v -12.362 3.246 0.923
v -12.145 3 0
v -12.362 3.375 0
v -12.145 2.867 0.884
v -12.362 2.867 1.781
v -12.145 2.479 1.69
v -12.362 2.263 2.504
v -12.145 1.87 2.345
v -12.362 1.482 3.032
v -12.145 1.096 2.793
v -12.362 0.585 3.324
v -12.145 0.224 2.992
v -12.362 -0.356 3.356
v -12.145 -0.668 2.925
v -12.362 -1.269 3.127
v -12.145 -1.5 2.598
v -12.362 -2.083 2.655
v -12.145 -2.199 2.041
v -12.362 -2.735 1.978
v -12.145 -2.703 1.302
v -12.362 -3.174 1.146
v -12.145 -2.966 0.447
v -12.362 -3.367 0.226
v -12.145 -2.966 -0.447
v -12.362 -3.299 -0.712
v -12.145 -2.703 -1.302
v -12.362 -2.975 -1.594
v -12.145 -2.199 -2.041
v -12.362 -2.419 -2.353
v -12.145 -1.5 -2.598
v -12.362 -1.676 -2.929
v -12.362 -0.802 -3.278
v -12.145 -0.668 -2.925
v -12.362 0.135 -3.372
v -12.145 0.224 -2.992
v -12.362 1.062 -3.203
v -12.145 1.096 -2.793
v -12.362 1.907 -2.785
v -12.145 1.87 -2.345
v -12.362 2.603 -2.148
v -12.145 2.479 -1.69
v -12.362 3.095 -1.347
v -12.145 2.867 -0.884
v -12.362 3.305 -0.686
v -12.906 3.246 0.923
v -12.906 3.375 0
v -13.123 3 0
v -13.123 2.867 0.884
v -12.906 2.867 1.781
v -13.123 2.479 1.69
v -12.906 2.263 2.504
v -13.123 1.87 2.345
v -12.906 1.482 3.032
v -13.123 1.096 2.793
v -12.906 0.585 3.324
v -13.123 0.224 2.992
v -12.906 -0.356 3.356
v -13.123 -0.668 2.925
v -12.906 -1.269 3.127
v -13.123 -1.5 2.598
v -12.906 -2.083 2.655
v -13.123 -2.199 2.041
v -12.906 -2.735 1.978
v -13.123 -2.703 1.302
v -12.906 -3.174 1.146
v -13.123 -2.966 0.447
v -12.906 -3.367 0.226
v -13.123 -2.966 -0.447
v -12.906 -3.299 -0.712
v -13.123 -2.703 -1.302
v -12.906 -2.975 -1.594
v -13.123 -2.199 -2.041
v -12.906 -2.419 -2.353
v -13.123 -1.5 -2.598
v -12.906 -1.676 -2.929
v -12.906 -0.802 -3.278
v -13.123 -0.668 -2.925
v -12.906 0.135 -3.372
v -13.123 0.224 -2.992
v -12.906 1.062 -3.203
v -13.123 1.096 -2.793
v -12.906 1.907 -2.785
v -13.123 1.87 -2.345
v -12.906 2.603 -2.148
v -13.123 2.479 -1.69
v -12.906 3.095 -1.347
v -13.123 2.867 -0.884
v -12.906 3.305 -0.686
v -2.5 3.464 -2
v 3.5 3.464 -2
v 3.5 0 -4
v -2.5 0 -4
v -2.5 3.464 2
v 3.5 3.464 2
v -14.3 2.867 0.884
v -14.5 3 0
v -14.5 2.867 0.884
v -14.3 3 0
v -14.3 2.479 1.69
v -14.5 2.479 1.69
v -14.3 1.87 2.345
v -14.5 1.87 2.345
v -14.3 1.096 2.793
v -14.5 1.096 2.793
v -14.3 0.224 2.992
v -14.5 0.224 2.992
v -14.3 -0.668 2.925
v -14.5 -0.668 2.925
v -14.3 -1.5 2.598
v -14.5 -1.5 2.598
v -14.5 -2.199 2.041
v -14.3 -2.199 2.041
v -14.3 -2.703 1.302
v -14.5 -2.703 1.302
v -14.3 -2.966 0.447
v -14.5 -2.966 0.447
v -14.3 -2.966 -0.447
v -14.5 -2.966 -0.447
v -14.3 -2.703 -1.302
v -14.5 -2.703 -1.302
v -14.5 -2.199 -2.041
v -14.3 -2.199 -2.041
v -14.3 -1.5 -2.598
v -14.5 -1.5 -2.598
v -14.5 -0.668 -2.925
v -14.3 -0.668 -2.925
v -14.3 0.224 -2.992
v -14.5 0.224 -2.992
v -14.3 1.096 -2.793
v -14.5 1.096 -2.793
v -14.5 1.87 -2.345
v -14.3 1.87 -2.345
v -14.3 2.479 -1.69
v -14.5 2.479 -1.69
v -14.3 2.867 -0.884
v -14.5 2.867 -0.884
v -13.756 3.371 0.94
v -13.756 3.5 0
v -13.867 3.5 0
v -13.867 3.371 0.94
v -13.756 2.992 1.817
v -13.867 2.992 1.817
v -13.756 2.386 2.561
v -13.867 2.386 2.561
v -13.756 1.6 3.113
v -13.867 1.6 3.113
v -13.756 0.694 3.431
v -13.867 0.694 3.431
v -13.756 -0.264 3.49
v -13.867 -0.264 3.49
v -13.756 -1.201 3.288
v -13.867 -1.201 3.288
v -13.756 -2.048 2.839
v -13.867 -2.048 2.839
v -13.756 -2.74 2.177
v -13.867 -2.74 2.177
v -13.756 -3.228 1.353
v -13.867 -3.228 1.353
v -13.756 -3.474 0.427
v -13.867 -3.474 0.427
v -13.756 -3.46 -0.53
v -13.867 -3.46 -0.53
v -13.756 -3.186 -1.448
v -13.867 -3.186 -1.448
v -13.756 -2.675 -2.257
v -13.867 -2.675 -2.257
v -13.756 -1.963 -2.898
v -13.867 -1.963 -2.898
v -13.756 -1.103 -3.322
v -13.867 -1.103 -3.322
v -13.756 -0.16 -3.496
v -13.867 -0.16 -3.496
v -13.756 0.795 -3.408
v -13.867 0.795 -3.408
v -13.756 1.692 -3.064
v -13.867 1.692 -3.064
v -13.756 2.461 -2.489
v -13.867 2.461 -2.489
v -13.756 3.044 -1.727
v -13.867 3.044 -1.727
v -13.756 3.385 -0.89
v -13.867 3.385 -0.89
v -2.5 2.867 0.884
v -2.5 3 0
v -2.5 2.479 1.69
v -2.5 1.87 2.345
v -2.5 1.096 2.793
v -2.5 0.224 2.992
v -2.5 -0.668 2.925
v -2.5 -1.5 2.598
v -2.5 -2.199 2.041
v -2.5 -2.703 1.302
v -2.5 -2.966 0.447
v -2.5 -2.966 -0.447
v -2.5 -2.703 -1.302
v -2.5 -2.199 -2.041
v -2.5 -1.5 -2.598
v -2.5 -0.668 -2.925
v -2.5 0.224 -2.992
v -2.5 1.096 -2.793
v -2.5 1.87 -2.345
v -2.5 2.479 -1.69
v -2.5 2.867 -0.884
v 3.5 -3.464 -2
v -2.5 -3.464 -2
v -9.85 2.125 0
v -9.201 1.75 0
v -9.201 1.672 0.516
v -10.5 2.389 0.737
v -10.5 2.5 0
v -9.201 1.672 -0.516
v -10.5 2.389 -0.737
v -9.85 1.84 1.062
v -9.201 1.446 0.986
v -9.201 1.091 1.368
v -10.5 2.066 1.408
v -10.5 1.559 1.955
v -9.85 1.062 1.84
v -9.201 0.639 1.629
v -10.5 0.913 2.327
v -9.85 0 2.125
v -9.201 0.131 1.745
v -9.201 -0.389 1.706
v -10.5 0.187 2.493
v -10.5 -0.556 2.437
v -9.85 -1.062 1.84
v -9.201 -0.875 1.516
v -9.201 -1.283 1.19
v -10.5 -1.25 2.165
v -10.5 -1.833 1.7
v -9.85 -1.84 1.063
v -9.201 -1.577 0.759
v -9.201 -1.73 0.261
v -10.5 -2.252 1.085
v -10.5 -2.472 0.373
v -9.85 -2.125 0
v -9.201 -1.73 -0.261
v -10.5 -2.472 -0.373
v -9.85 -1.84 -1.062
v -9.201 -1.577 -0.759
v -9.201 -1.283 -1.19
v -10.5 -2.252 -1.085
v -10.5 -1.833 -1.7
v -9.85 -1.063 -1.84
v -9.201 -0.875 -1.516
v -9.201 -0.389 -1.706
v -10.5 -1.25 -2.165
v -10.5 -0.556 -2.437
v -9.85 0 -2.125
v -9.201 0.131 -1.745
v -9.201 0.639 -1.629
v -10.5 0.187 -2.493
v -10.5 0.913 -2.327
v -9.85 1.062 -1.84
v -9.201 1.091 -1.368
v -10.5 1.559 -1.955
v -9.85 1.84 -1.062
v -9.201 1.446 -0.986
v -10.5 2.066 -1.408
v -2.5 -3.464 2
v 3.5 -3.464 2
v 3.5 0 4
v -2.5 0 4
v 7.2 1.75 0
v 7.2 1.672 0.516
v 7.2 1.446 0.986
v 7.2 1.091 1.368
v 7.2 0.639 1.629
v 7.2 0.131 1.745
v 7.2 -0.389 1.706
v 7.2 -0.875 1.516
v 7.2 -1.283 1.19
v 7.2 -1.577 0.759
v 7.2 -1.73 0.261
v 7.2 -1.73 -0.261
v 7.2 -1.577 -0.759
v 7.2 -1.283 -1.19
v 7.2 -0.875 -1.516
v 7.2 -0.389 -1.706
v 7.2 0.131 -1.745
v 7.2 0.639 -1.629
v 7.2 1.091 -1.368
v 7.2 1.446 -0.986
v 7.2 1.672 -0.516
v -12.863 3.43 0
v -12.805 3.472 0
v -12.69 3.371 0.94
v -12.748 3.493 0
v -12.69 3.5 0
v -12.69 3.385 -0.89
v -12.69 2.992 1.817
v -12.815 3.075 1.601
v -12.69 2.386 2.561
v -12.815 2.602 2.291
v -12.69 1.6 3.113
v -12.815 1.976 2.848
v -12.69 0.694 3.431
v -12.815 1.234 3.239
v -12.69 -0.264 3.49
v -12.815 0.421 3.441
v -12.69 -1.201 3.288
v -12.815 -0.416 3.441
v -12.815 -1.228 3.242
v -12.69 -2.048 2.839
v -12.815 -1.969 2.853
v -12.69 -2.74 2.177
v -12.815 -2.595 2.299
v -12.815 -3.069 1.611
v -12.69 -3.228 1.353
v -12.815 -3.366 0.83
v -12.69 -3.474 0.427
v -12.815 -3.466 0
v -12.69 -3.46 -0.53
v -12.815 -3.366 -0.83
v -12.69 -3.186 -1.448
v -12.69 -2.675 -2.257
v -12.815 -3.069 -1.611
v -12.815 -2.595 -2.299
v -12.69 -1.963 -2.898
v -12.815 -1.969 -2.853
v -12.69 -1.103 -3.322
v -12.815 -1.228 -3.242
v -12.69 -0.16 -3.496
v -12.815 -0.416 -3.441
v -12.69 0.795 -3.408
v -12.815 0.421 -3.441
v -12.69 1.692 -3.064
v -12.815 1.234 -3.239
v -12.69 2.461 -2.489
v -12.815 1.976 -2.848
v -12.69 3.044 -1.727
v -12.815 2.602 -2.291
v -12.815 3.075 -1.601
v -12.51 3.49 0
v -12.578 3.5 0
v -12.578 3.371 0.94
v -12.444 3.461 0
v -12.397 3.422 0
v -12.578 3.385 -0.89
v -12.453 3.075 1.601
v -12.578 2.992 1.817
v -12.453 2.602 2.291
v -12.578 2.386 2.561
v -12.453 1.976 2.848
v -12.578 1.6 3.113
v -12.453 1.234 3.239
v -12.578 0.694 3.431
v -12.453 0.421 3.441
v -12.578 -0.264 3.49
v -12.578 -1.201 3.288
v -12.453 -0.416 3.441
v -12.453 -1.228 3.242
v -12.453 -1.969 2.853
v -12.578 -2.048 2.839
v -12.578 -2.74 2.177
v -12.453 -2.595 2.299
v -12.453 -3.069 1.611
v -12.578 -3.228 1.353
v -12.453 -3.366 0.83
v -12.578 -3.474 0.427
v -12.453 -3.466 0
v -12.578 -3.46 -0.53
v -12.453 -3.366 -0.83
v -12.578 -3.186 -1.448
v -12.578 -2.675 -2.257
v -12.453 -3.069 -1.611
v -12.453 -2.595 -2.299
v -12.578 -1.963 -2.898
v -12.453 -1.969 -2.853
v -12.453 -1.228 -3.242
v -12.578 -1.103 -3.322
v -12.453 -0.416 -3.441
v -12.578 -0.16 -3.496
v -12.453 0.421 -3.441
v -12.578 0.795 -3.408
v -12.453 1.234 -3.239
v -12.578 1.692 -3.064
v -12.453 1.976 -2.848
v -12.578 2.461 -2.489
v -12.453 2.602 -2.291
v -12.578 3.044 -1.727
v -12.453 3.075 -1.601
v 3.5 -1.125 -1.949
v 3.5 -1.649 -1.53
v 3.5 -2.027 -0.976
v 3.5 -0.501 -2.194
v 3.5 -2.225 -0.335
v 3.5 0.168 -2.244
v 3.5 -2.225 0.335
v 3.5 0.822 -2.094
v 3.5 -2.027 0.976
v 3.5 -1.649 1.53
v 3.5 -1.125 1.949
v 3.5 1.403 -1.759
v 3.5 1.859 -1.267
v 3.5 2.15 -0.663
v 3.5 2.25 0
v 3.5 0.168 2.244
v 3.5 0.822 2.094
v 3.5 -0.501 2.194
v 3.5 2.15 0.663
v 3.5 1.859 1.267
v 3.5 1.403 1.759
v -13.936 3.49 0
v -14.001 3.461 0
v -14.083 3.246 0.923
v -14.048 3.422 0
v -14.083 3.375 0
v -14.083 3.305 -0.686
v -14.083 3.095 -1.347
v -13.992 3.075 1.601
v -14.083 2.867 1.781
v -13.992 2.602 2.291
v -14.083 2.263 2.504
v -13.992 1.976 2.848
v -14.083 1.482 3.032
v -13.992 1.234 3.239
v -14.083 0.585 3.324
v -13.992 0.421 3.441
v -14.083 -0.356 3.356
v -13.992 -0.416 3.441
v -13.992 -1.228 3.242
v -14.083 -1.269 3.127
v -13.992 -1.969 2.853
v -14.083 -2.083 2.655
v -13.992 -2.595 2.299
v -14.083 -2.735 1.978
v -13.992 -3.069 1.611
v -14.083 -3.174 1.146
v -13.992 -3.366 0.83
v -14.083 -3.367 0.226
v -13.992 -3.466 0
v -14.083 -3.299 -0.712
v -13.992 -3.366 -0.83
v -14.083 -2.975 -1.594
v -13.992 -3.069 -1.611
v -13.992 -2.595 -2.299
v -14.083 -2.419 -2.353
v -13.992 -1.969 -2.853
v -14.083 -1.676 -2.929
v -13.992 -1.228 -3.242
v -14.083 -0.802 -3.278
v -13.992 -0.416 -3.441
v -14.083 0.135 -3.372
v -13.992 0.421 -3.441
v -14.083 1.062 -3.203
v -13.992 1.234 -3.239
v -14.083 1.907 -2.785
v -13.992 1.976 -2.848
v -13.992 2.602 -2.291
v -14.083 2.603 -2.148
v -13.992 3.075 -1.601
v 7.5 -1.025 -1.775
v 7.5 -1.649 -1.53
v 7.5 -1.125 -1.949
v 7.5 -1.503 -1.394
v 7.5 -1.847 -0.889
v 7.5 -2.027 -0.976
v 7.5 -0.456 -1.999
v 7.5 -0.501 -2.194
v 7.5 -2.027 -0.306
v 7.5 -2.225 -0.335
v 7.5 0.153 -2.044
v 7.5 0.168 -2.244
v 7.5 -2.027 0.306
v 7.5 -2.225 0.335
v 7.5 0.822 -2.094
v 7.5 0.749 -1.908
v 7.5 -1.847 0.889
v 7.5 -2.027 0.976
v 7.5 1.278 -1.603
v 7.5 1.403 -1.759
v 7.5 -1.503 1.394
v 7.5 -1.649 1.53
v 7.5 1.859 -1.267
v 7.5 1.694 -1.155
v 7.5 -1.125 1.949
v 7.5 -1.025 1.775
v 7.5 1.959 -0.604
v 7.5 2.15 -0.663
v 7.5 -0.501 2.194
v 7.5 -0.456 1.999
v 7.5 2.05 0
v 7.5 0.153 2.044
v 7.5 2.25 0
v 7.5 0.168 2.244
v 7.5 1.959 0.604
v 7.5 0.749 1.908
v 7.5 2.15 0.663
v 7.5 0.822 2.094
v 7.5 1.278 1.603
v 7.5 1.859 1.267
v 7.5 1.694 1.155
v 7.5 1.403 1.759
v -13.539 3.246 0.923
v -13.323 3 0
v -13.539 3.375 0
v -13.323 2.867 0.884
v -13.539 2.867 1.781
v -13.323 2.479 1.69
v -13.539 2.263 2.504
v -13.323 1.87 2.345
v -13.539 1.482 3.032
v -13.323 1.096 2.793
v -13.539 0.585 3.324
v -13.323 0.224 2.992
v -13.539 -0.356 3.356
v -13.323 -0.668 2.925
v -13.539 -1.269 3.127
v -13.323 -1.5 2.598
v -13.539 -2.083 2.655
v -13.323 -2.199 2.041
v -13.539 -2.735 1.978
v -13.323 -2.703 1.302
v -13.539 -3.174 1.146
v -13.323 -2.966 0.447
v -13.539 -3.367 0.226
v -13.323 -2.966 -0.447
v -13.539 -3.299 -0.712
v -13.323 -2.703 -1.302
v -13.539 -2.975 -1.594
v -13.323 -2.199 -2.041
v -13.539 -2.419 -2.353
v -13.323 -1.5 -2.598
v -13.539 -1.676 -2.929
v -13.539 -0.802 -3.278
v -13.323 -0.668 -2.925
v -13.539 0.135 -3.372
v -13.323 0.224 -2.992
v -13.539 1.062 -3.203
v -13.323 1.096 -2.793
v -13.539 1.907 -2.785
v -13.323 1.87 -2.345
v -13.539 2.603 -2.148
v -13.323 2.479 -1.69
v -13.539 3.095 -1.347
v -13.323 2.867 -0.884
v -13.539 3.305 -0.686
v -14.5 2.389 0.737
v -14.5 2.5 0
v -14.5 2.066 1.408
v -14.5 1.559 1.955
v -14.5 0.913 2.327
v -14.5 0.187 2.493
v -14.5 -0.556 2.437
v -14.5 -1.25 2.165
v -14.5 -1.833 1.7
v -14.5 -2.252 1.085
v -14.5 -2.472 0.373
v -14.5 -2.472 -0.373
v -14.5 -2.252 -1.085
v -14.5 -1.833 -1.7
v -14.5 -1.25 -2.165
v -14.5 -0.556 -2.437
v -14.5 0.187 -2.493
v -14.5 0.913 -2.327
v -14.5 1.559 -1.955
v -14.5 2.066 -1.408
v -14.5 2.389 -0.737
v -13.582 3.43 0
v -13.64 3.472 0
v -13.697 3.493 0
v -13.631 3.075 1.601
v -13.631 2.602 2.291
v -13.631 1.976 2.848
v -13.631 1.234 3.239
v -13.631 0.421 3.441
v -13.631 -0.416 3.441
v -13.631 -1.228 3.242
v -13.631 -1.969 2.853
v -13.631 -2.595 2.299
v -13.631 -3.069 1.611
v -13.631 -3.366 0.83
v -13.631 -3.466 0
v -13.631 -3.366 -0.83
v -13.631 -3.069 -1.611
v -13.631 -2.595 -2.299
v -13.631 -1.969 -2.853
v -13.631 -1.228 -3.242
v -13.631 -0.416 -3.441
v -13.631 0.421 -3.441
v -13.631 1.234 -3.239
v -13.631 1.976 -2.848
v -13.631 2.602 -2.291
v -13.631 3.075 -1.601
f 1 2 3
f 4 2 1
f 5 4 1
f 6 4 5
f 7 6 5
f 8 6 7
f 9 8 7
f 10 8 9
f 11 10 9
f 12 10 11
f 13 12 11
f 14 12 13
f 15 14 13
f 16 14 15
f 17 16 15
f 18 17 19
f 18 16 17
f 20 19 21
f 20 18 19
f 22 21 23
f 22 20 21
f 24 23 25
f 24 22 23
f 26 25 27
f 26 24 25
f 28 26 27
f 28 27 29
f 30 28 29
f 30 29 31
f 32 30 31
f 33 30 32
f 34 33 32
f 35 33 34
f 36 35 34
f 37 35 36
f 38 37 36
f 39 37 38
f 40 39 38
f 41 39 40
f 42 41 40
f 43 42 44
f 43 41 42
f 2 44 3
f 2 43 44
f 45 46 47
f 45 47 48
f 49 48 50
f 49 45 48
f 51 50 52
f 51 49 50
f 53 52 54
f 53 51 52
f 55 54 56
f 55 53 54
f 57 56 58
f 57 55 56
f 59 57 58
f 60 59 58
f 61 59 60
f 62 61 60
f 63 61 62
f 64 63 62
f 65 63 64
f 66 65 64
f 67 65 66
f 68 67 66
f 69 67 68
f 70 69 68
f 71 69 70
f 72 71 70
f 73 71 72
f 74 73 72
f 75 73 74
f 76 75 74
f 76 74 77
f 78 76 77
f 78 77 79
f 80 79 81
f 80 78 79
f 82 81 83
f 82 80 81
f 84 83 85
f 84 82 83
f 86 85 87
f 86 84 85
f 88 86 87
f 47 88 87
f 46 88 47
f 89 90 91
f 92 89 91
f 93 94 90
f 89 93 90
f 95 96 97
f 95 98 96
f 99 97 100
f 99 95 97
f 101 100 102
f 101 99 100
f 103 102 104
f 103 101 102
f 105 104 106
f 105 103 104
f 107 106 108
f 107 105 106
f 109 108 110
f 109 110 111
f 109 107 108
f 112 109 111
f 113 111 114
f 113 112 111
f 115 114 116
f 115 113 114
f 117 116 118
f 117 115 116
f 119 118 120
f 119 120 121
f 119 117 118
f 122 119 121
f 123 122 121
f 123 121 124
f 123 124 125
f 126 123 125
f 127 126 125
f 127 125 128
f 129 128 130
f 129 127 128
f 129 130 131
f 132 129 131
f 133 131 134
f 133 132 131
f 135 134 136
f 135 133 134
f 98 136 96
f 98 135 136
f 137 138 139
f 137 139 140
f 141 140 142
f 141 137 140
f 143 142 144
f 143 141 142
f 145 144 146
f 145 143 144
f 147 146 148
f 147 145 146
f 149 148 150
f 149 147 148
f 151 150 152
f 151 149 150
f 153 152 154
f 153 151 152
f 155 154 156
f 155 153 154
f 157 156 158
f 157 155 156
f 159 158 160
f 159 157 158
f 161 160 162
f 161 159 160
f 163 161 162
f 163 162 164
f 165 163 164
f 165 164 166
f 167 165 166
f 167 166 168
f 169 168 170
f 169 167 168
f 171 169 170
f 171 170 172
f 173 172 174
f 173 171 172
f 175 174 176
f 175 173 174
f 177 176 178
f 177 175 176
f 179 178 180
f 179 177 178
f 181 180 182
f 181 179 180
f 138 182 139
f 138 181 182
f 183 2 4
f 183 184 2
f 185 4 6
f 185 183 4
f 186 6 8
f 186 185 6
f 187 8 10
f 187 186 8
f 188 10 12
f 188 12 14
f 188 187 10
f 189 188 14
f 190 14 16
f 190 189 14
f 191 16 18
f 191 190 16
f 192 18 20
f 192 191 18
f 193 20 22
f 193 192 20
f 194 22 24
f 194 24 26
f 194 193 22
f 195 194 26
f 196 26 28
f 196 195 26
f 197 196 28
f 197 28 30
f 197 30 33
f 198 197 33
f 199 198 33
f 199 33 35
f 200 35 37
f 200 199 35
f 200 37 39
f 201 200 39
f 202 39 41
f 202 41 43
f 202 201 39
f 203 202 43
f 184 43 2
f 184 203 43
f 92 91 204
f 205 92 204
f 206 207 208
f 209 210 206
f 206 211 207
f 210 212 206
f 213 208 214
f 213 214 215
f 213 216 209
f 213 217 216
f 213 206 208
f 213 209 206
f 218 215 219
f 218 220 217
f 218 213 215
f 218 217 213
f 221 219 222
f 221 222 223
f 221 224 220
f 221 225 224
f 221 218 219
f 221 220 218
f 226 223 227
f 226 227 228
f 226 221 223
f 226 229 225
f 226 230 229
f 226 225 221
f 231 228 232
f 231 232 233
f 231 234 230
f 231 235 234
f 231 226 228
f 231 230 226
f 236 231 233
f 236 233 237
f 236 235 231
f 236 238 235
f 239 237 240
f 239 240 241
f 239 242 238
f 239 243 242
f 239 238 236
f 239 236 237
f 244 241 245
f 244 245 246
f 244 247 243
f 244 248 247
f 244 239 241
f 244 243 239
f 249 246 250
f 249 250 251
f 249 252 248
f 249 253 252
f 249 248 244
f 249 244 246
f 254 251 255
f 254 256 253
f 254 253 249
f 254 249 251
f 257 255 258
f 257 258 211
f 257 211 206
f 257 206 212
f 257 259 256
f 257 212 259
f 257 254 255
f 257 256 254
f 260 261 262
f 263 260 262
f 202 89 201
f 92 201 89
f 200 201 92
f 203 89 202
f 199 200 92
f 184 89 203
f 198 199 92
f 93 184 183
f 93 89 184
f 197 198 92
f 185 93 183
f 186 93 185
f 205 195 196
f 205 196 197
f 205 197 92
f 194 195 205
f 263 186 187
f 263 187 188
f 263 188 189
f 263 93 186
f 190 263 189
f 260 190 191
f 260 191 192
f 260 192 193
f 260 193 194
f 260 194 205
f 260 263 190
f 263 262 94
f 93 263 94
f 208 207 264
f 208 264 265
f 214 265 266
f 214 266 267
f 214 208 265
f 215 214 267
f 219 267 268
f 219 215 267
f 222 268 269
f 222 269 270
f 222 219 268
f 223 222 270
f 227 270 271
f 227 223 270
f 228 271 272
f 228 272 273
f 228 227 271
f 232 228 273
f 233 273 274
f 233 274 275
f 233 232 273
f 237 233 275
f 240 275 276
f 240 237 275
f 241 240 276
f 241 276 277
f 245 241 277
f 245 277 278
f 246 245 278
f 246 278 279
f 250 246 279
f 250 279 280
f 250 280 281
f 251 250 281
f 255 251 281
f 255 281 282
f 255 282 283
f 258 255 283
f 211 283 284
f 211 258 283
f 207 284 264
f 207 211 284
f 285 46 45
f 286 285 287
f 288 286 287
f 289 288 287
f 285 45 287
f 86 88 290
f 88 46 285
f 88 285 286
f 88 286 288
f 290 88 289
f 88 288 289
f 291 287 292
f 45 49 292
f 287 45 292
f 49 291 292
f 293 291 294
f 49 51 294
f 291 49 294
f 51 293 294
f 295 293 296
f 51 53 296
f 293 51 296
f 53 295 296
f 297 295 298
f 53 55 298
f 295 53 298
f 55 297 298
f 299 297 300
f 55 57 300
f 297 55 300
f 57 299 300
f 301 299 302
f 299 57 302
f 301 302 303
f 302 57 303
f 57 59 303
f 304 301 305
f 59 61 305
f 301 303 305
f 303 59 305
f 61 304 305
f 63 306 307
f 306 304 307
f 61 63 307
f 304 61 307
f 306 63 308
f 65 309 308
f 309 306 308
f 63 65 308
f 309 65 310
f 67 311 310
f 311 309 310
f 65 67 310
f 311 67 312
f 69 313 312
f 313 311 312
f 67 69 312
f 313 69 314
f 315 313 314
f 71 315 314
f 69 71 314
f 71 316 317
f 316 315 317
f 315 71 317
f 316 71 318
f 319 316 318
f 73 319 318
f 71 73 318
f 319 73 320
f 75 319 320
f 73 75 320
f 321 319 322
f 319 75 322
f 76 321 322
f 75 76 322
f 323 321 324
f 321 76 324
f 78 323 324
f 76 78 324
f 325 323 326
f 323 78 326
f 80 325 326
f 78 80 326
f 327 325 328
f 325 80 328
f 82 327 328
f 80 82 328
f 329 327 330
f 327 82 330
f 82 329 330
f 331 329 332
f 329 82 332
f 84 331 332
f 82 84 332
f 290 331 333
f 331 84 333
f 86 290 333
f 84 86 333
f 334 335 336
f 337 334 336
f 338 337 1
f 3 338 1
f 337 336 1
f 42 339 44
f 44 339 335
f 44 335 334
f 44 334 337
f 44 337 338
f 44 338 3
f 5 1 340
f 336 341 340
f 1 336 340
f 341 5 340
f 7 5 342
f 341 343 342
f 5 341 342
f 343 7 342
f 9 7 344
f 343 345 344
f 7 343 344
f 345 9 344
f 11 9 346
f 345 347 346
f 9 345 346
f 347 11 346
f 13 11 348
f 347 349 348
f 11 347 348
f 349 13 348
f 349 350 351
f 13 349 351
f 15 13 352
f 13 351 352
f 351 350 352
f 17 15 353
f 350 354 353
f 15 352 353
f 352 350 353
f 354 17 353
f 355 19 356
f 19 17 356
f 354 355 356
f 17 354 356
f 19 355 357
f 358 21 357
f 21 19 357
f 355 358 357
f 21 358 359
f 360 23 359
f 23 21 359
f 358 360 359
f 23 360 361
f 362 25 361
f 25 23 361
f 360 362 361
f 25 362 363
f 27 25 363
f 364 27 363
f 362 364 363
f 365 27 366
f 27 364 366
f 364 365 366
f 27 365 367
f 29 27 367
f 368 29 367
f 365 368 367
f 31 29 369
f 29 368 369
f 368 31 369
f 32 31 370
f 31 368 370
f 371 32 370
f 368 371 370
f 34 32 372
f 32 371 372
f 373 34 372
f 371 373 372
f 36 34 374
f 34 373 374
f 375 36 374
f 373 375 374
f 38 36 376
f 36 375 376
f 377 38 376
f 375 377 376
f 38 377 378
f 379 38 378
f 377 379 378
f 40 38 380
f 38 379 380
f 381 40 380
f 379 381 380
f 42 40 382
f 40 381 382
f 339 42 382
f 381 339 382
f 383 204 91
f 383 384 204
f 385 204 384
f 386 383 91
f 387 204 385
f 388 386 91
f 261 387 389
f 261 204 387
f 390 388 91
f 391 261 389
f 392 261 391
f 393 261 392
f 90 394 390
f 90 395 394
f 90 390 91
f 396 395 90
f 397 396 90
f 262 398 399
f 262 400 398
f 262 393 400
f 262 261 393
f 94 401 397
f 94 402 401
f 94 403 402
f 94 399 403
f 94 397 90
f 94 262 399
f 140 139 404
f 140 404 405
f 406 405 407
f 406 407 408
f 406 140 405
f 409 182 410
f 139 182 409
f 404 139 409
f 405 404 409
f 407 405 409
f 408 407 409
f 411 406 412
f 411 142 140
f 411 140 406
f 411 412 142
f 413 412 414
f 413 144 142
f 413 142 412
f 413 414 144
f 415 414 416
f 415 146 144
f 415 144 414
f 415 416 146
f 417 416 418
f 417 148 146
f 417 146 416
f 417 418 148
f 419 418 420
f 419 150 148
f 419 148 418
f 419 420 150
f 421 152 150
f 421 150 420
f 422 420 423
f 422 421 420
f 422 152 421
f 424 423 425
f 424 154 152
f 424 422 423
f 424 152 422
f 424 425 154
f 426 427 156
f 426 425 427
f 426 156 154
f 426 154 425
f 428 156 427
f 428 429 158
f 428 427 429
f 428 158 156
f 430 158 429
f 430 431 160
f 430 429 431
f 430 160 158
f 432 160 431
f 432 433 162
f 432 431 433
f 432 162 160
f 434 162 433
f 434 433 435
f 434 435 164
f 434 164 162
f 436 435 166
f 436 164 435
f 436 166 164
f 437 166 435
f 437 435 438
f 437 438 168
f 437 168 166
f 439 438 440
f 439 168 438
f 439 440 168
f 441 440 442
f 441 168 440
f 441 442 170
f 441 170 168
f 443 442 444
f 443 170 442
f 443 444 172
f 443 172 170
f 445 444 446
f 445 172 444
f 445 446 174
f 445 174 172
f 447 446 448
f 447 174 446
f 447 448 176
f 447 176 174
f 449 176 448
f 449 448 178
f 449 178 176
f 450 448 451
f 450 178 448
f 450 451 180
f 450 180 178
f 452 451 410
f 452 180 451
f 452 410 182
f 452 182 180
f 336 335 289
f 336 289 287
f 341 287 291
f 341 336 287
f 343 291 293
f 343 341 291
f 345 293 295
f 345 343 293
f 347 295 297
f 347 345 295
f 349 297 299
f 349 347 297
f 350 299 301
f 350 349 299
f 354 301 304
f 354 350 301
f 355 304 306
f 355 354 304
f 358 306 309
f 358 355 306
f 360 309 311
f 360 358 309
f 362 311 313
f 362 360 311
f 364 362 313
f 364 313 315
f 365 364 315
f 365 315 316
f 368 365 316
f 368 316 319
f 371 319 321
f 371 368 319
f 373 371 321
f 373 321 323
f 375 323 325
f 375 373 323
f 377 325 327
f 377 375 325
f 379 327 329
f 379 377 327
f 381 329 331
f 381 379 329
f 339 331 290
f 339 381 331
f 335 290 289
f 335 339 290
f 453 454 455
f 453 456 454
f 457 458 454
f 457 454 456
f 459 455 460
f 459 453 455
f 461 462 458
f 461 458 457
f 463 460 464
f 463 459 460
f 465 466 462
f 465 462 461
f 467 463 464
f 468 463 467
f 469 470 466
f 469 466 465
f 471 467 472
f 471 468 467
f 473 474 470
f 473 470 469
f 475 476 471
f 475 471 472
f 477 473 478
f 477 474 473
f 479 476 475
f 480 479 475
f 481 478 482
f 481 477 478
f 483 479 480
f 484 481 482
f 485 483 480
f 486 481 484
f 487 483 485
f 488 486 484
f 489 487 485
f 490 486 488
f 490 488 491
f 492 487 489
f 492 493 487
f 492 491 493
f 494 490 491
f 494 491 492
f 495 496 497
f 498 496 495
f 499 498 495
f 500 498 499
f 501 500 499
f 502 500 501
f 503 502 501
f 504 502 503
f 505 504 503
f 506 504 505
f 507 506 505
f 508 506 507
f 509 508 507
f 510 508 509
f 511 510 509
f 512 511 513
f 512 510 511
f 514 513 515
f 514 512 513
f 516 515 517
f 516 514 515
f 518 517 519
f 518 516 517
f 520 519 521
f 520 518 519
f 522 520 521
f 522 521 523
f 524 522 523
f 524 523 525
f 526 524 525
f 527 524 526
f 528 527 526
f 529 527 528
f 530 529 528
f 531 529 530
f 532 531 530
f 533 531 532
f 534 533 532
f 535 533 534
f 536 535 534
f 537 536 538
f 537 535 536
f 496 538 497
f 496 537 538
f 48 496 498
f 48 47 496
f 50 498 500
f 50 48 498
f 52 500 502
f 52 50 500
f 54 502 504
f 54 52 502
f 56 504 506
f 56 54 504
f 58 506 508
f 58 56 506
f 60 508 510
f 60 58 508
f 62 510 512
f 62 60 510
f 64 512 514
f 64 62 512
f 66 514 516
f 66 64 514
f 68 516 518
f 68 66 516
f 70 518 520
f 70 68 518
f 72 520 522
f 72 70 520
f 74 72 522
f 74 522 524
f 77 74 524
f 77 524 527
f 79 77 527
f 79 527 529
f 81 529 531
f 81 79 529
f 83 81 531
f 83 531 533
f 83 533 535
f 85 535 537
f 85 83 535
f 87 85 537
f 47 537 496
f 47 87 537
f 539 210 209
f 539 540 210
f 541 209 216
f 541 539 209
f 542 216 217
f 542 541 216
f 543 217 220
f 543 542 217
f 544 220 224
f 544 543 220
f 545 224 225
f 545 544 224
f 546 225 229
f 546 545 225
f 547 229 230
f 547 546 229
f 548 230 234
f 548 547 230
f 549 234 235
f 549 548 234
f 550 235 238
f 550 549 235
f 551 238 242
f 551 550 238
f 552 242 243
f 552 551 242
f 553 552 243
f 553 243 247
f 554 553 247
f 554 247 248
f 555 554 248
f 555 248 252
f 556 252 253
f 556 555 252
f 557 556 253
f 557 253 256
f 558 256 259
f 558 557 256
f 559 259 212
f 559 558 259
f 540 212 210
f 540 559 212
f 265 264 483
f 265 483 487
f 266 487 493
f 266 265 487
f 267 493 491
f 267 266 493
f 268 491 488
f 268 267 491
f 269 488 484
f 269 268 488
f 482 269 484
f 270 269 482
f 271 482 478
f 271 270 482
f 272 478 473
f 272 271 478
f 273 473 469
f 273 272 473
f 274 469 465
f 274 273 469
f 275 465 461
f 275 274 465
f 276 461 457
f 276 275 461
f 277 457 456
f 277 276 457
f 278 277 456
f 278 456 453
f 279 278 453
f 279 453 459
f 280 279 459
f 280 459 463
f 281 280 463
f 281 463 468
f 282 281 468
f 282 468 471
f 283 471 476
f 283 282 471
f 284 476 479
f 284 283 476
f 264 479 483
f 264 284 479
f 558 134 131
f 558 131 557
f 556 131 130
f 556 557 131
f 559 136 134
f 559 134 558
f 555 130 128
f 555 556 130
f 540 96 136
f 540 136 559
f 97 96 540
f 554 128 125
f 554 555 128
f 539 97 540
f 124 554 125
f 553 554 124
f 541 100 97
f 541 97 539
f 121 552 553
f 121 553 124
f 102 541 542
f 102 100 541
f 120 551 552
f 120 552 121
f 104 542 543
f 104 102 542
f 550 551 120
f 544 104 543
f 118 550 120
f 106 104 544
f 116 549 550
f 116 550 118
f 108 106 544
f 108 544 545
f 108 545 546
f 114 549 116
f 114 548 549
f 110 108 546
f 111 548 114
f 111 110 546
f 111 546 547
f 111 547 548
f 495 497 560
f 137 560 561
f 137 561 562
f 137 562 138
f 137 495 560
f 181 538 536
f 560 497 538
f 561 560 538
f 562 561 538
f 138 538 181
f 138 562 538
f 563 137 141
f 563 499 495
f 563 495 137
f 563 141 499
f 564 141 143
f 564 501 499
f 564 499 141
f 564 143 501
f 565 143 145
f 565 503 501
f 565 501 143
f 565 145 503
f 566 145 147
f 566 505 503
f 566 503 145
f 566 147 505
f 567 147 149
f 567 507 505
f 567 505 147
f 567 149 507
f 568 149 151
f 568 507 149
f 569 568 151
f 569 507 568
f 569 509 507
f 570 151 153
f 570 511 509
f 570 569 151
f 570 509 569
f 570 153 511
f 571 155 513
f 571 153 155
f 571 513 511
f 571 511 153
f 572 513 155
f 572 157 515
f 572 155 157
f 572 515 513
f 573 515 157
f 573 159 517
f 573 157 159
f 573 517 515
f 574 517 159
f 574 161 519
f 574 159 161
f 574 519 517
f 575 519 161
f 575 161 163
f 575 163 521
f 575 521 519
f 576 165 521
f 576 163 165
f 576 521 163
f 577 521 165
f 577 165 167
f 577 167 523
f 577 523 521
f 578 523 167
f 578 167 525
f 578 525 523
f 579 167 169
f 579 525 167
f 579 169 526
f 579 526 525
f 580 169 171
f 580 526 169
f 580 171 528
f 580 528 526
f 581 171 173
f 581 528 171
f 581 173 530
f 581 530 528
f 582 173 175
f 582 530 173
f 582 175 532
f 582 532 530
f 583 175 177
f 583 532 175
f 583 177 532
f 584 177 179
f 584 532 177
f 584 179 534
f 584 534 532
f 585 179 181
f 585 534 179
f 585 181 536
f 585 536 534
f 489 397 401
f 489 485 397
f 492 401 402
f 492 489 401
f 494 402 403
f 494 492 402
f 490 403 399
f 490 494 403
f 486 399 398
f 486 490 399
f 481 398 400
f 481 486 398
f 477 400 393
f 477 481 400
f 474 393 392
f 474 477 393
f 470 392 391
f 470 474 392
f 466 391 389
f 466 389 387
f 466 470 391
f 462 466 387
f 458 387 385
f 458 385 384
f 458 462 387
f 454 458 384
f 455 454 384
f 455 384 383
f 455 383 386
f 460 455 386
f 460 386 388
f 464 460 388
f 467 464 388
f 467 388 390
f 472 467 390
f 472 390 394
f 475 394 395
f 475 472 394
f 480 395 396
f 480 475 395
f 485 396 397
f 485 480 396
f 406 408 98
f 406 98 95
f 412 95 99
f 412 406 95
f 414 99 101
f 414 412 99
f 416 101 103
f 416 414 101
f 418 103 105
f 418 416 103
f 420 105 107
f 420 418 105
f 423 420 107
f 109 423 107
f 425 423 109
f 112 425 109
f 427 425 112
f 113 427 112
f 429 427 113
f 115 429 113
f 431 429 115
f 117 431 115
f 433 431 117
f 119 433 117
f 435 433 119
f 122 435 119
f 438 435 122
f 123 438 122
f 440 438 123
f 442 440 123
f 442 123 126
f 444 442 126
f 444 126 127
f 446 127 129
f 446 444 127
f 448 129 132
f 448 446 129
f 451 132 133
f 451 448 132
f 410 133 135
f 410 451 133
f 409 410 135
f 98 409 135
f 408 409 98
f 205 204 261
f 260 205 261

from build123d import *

# Parameters (mm, degrees)
CORTE_EXTRUS_O1_REACH = 20
FILETE1_R             = 0.25
FILETE2_R             = 0.25
CHANFRO1_SIZE         = 0.3


with BuildPart() as part:
    # Esboço1 → Revolução1 (revolve)
    with BuildSketch(Plane.XY):
        Polygon((-13.322649731, 3), (-13.122649731, 3), (-12.833974596, 3.5), (-12.433974596, 3.5), (-12.145299462, 3), (-2.5, 3), (-2.5, 4), (3.5, 4), (3.5, 2.25), (7.5, 2.25), (7.5, 1.75), (-9.200961894, 1.75), (-10.5, 2.5), (-14.5, 2.5), (-14.5, 3), (-14.3, 3), (-14.011324865, 3.5), (-13.611324865, 3.5), align=None)
    revolve(axis=Axis((-29.721905334, 0, 0), (1, 0, 0)))

    # Esboço2 → Corte-extrusão1 (cut, up to next)
    with BuildSketch(Plane(origin=(3.5, 0, 0), x_dir=(0, 0, -1), z_dir=(1, 0, 0)), mode=Mode.PRIVATE) as corte_extrus_o1_sk1:
        with BuildLine():
            Line((-2, 3.464101615), (2, 3.464101615))
            ThreePointArc((2, 3.464101615), (0, 4), (-2, 3.464101615))
        make_face()
    corte_extrus_o1_tool1 = extrude(corte_extrus_o1_sk1.sketch, amount=-CORTE_EXTRUS_O1_REACH, mode=Mode.PRIVATE) & part.part
    add(corte_extrus_o1_tool1.solids().sort_by_distance((3.5, 3.679741, 0))[0], mode=Mode.SUBTRACT)
    # Esboço2 → Corte-extrusão1 (cut, up to next)
    with BuildSketch(Plane(origin=(3.5, 0, 0), x_dir=(0, 0, -1), z_dir=(1, 0, 0)), mode=Mode.PRIVATE) as corte_extrus_o1_sk2:
        with BuildLine():
            Line((-4, 0), (-2, 3.464101615))
            ThreePointArc((-2, 3.464101615), (-3.464101615, 2), (-4, 0))
        make_face()
    corte_extrus_o1_tool2 = extrude(corte_extrus_o1_sk2.sketch, amount=-CORTE_EXTRUS_O1_REACH, mode=Mode.PRIVATE) & part.part
    add(corte_extrus_o1_tool2.solids().sort_by_distance((3.5, 1.839871, 3.18675))[0], mode=Mode.SUBTRACT)
    # Esboço2 → Corte-extrusão1 (cut, up to next)
    with BuildSketch(Plane(origin=(3.5, 0, 0), x_dir=(0, 0, -1), z_dir=(1, 0, 0)), mode=Mode.PRIVATE) as corte_extrus_o1_sk3:
        with BuildLine():
            ThreePointArc((-4, 0), (-3.464101615, -2), (-2, -3.464101615))
            Line((-2, -3.464101615), (-4, 0))
        make_face()
    corte_extrus_o1_tool3 = extrude(corte_extrus_o1_sk3.sketch, amount=-CORTE_EXTRUS_O1_REACH, mode=Mode.PRIVATE) & part.part
    add(corte_extrus_o1_tool3.solids().sort_by_distance((3.5, -1.839871, 3.18675))[0], mode=Mode.SUBTRACT)
    # Esboço2 → Corte-extrusão1 (cut, up to next)
    with BuildSketch(Plane(origin=(3.5, 0, 0), x_dir=(0, 0, -1), z_dir=(1, 0, 0)), mode=Mode.PRIVATE) as corte_extrus_o1_sk4:
        with BuildLine():
            ThreePointArc((-2, -3.464101615), (0, -4), (2, -3.464101615))
            Line((2, -3.464101615), (-2, -3.464101615))
        make_face()
    corte_extrus_o1_tool4 = extrude(corte_extrus_o1_sk4.sketch, amount=-CORTE_EXTRUS_O1_REACH, mode=Mode.PRIVATE) & part.part
    add(corte_extrus_o1_tool4.solids().sort_by_distance((3.5, -3.679741, 0))[0], mode=Mode.SUBTRACT)
    # Esboço2 → Corte-extrusão1 (cut, up to next)
    with BuildSketch(Plane(origin=(3.5, 0, 0), x_dir=(0, 0, -1), z_dir=(1, 0, 0)), mode=Mode.PRIVATE) as corte_extrus_o1_sk5:
        with BuildLine():
            ThreePointArc((2, -3.464101615), (3.464101615, -2), (4, 0))
            Line((4, 0), (2, -3.464101615))
        make_face()
    corte_extrus_o1_tool5 = extrude(corte_extrus_o1_sk5.sketch, amount=-CORTE_EXTRUS_O1_REACH, mode=Mode.PRIVATE) & part.part
    add(corte_extrus_o1_tool5.solids().sort_by_distance((3.5, -1.839871, -3.18675))[0], mode=Mode.SUBTRACT)
    # Esboço2 → Corte-extrusão1 (cut, up to next)
    with BuildSketch(Plane(origin=(3.5, 0, 0), x_dir=(0, 0, -1), z_dir=(1, 0, 0)), mode=Mode.PRIVATE) as corte_extrus_o1_sk6:
        with BuildLine():
            Line((2, 3.464101615), (4, 0))
            ThreePointArc((4, 0), (3.464101615, 2), (2, 3.464101615))
        make_face()
    corte_extrus_o1_tool6 = extrude(corte_extrus_o1_sk6.sketch, amount=-CORTE_EXTRUS_O1_REACH, mode=Mode.PRIVATE) & part.part
    add(corte_extrus_o1_tool6.solids().sort_by_distance((3.5, 1.839871, -3.18675))[0], mode=Mode.SUBTRACT)

    # Filete1
    filete1_edges = [part.edges().sort_by_distance(p)[0] for p in [
        (-14.011324865, -3.5, 0),
        (-13.611324865, -3.5, 0),
    ]]
    fillet(filete1_edges, radius=FILETE1_R)

    # Filete2
    filete2_edges = [part.edges().sort_by_distance(p)[0] for p in [
        (-12.833974596, -3.5, 0),
        (-12.433974596, -3.5, 0),
    ]]
    fillet(filete2_edges, radius=FILETE2_R)

    # Chanfro1
    chanfro1_edges = [part.edges().sort_by_distance(p)[0] for p in [
        (7.5, -1.75, 0),
    ]]
    chamfer(chanfro1_edges, length=CHANFRO1_SIZE)


solid = part.part
